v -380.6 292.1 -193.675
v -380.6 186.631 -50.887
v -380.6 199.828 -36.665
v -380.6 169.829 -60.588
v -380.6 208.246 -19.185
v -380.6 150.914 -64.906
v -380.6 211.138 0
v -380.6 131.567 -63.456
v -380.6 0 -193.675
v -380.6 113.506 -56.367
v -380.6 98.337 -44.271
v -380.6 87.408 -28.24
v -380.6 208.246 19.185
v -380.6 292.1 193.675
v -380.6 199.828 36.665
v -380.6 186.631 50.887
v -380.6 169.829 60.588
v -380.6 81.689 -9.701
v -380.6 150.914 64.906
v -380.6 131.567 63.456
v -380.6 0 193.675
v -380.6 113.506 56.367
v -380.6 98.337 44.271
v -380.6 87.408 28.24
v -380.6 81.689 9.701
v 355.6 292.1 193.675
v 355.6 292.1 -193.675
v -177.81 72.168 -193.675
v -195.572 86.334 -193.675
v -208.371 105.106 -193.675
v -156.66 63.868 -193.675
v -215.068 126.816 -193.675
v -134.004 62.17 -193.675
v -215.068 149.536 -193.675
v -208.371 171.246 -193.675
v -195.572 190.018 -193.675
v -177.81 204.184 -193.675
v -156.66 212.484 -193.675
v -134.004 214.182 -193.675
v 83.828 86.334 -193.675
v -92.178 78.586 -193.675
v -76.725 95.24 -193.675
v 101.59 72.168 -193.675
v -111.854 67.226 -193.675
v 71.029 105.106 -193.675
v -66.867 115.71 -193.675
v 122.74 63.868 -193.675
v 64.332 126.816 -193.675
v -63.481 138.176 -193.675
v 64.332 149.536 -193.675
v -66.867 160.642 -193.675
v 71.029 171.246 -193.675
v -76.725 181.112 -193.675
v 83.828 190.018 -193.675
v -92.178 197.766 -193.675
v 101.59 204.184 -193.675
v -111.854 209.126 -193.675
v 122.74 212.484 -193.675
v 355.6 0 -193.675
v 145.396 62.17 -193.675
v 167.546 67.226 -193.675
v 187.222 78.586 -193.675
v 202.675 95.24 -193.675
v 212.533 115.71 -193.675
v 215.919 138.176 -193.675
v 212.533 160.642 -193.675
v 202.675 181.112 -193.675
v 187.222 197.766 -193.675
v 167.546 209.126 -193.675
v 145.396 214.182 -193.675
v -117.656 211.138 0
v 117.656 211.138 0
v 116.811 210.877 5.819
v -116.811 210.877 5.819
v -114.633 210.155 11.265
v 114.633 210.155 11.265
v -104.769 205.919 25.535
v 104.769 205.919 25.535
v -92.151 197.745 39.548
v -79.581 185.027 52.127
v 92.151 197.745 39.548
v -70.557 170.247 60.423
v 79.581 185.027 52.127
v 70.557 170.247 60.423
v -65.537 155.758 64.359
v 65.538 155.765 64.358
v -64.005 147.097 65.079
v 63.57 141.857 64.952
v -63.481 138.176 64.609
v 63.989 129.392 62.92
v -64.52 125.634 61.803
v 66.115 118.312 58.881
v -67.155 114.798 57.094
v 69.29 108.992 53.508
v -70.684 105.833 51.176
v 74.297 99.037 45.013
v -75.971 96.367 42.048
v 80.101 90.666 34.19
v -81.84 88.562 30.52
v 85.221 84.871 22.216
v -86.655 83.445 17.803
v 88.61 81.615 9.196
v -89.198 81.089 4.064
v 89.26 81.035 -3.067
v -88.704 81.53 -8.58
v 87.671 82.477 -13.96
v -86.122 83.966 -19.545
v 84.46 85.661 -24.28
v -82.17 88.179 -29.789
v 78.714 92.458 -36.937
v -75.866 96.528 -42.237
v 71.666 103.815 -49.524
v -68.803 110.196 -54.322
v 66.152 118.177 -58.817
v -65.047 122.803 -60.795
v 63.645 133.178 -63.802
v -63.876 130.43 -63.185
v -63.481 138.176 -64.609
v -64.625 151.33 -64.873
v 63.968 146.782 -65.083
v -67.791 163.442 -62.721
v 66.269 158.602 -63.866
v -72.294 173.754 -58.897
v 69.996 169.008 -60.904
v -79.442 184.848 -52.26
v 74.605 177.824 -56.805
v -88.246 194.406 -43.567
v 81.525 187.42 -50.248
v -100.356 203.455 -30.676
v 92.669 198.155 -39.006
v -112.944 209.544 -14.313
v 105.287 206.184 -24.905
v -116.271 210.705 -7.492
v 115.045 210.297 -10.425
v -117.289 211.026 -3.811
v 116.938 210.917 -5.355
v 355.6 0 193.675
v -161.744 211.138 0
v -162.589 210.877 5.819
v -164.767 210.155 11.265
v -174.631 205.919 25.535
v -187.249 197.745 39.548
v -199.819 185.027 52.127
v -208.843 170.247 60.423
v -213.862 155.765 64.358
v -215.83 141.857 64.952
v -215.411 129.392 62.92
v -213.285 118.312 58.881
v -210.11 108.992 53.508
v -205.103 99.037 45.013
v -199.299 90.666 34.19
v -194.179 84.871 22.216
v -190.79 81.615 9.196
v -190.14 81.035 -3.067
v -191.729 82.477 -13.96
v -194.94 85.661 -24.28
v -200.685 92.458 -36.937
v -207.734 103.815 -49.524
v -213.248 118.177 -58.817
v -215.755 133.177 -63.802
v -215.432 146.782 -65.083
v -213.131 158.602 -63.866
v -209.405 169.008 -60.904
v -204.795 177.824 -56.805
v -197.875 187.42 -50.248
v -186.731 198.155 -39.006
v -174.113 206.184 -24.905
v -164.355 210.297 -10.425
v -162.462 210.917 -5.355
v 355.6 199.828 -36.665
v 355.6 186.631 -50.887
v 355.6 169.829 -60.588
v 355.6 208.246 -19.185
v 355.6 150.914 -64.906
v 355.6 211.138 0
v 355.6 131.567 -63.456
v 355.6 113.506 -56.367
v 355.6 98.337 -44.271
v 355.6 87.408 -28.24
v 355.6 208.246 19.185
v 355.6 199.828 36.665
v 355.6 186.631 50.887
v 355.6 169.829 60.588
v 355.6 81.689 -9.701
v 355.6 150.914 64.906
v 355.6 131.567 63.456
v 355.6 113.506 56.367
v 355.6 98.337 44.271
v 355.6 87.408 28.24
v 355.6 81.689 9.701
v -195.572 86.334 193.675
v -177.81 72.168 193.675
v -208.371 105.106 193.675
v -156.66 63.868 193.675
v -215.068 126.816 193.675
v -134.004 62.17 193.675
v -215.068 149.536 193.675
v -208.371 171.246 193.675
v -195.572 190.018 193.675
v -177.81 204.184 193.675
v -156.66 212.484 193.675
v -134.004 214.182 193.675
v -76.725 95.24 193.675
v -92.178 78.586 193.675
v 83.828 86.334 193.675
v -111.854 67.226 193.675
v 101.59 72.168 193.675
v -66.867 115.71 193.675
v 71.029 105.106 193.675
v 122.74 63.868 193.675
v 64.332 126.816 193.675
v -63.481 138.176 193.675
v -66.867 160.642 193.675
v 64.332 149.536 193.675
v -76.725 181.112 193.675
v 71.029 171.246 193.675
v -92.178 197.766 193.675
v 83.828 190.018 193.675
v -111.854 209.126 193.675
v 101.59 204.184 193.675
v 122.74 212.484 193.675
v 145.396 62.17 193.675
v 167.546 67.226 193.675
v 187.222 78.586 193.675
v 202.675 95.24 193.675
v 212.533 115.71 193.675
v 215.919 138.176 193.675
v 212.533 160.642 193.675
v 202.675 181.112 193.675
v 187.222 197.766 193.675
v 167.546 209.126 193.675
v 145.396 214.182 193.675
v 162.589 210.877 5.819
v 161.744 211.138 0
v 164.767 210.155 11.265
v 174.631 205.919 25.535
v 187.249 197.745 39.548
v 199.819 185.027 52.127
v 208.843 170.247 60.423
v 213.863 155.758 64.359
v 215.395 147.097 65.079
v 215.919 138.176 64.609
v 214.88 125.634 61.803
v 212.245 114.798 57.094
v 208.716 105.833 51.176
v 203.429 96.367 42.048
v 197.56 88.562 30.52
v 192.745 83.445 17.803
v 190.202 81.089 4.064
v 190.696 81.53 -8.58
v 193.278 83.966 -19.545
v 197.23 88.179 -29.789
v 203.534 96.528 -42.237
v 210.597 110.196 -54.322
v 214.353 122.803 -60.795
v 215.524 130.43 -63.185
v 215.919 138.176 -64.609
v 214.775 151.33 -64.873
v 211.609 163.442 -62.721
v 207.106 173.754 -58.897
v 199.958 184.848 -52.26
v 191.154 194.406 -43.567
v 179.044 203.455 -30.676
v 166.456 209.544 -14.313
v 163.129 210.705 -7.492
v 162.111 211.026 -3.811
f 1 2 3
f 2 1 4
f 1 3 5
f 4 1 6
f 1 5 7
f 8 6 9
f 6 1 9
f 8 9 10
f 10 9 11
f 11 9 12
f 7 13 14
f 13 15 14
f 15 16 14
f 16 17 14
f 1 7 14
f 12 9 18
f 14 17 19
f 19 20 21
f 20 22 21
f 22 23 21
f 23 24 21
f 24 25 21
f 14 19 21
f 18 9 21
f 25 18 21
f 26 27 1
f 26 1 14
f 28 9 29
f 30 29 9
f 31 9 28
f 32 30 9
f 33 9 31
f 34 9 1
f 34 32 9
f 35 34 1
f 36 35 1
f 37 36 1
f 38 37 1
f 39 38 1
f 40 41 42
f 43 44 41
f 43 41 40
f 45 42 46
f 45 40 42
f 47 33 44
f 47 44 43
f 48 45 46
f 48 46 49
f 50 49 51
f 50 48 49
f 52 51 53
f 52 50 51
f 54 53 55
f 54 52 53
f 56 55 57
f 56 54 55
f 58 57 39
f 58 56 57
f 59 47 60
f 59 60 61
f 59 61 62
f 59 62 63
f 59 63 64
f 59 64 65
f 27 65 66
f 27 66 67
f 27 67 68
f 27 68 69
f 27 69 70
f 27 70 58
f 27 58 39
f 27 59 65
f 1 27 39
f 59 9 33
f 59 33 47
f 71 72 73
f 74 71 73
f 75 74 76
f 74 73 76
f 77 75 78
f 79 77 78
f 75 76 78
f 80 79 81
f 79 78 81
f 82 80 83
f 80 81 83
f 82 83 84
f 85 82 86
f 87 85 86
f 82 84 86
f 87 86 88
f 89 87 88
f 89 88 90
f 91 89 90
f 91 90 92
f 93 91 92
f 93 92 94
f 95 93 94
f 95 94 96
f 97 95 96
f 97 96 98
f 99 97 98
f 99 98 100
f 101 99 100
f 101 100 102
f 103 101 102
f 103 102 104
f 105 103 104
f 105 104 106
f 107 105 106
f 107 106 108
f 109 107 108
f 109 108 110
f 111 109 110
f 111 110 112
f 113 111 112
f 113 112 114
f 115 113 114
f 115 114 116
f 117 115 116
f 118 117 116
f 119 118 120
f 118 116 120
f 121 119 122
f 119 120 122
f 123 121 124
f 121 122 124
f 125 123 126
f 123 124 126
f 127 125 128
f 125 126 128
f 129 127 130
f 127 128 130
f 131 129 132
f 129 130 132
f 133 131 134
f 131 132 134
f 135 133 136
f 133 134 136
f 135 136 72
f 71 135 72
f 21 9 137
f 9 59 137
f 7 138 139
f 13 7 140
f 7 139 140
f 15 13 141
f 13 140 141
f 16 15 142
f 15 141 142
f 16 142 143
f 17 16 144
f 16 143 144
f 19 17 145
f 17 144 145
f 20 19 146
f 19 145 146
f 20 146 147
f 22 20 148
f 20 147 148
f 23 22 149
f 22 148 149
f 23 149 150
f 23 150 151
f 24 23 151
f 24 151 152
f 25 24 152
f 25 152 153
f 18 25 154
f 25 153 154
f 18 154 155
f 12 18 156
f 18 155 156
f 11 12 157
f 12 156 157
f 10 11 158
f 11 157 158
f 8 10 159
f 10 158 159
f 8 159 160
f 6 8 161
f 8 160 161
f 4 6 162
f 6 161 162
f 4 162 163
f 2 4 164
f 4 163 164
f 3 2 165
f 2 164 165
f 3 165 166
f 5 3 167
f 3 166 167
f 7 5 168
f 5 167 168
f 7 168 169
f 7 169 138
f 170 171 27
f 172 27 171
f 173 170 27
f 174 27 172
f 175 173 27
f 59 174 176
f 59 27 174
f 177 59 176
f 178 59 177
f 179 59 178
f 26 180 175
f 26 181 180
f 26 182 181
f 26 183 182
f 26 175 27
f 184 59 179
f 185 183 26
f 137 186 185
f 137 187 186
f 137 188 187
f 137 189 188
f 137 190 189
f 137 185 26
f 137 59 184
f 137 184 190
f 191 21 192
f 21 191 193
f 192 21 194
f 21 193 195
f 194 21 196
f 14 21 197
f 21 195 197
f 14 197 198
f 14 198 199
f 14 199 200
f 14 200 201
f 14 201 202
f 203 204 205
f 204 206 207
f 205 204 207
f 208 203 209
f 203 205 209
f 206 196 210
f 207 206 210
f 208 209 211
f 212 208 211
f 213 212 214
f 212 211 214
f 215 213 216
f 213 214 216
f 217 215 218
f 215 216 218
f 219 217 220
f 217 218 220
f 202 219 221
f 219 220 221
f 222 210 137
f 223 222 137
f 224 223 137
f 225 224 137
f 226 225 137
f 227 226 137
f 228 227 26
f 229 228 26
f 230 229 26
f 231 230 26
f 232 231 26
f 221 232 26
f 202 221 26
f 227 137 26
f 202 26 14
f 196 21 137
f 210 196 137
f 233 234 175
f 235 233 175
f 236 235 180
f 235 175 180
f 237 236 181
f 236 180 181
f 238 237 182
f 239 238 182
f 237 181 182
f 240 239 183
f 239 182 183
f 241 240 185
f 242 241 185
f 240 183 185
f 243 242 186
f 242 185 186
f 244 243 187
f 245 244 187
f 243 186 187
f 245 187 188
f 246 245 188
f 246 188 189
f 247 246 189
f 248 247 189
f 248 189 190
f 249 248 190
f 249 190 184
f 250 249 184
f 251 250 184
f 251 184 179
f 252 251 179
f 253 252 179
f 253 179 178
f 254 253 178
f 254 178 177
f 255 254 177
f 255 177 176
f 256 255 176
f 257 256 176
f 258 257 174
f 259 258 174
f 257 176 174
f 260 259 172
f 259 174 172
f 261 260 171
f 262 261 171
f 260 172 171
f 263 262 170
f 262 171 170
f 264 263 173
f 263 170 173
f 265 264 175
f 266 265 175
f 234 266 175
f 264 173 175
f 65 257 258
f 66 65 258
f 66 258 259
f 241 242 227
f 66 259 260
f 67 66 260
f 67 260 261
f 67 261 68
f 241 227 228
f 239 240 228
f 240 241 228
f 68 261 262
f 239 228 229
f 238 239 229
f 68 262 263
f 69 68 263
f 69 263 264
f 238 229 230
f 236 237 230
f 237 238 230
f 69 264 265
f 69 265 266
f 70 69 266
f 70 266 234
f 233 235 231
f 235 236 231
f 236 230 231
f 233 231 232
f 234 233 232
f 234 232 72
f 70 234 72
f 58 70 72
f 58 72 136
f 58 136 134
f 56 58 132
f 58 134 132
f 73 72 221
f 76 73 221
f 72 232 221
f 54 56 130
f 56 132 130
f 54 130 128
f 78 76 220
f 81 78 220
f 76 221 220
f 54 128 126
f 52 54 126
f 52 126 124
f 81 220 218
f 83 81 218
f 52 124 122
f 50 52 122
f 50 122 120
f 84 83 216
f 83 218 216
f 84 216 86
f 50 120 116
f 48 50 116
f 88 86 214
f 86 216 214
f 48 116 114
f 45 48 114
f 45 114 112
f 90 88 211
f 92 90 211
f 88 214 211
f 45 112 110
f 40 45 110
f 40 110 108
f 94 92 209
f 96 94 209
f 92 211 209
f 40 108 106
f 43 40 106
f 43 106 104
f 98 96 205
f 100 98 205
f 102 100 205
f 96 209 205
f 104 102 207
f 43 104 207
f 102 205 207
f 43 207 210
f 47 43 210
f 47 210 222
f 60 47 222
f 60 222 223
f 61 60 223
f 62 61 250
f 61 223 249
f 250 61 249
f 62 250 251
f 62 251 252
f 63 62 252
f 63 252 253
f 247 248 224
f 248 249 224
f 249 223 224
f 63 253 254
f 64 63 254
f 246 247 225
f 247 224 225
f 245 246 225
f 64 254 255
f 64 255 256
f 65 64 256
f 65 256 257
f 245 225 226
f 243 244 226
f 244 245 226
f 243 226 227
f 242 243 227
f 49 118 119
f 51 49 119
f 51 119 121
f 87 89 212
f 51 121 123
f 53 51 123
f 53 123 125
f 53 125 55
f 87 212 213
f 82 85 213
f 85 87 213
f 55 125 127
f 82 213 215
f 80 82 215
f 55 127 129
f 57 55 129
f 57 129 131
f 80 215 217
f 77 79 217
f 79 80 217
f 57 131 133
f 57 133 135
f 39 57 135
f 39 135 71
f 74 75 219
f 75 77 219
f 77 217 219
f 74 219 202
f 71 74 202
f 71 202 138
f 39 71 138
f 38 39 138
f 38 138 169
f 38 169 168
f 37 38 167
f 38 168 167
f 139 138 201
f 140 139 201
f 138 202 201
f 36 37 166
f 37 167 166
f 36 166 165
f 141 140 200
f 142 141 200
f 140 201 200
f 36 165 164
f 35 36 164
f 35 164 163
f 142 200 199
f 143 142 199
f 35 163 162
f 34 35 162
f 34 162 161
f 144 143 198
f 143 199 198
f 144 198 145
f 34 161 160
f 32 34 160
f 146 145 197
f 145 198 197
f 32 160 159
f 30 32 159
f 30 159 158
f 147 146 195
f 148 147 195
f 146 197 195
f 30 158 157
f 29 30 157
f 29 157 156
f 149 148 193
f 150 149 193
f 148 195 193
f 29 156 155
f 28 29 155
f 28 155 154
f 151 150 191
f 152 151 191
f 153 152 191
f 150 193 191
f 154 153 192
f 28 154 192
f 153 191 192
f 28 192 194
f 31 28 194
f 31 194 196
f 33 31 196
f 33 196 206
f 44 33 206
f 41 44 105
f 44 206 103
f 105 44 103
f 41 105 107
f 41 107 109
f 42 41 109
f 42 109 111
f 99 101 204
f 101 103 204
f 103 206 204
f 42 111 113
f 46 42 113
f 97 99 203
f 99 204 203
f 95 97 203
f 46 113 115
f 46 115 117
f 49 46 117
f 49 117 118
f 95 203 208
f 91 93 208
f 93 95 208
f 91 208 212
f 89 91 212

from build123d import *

# Parameters (mm, degrees)
F0_W     = 711.2
F0_H     = 387.35
F1_DEPTH = 292.1
F2_R     = 65.0875
F3_DEPTH = 375
F4_R     = 76.219
F5_DEPTH = 388
F7_DEPTH = 25


with BuildPart() as f1:
    # F0 (on Front) → F1 (new body)
    with BuildSketch(Plane.XZ):
        Rectangle(F0_W, F0_H)
    extrude(amount=-F1_DEPTH)

    # F2 (on Right) → F3 (cut, symmetric)
    with BuildSketch(Plane.YZ):
        with Locations((146.05, 0)):
            Circle(F2_R)
    extrude(amount=F3_DEPTH, both=True, mode=Mode.SUBTRACT)

    # F4 (on face) → F5 (cut)
    with BuildSketch(Plane.XY.offset(193.675)):
        with Locations((139.7, 138.176)):
            Circle(F4_R)
        with Locations((-139.7, 138.176)):
            Circle(F4_R)
    extrude(amount=-F5_DEPTH, mode=Mode.SUBTRACT)

    # F7 (add): a face of the model
    f7_faces = [f1.faces().sort_by_distance(p)[0] for p in [
        (-355.6, 146.05, 188.823583377),
    ]]
    extrude(f7_faces, amount=F7_DEPTH)


solid = f1.part
